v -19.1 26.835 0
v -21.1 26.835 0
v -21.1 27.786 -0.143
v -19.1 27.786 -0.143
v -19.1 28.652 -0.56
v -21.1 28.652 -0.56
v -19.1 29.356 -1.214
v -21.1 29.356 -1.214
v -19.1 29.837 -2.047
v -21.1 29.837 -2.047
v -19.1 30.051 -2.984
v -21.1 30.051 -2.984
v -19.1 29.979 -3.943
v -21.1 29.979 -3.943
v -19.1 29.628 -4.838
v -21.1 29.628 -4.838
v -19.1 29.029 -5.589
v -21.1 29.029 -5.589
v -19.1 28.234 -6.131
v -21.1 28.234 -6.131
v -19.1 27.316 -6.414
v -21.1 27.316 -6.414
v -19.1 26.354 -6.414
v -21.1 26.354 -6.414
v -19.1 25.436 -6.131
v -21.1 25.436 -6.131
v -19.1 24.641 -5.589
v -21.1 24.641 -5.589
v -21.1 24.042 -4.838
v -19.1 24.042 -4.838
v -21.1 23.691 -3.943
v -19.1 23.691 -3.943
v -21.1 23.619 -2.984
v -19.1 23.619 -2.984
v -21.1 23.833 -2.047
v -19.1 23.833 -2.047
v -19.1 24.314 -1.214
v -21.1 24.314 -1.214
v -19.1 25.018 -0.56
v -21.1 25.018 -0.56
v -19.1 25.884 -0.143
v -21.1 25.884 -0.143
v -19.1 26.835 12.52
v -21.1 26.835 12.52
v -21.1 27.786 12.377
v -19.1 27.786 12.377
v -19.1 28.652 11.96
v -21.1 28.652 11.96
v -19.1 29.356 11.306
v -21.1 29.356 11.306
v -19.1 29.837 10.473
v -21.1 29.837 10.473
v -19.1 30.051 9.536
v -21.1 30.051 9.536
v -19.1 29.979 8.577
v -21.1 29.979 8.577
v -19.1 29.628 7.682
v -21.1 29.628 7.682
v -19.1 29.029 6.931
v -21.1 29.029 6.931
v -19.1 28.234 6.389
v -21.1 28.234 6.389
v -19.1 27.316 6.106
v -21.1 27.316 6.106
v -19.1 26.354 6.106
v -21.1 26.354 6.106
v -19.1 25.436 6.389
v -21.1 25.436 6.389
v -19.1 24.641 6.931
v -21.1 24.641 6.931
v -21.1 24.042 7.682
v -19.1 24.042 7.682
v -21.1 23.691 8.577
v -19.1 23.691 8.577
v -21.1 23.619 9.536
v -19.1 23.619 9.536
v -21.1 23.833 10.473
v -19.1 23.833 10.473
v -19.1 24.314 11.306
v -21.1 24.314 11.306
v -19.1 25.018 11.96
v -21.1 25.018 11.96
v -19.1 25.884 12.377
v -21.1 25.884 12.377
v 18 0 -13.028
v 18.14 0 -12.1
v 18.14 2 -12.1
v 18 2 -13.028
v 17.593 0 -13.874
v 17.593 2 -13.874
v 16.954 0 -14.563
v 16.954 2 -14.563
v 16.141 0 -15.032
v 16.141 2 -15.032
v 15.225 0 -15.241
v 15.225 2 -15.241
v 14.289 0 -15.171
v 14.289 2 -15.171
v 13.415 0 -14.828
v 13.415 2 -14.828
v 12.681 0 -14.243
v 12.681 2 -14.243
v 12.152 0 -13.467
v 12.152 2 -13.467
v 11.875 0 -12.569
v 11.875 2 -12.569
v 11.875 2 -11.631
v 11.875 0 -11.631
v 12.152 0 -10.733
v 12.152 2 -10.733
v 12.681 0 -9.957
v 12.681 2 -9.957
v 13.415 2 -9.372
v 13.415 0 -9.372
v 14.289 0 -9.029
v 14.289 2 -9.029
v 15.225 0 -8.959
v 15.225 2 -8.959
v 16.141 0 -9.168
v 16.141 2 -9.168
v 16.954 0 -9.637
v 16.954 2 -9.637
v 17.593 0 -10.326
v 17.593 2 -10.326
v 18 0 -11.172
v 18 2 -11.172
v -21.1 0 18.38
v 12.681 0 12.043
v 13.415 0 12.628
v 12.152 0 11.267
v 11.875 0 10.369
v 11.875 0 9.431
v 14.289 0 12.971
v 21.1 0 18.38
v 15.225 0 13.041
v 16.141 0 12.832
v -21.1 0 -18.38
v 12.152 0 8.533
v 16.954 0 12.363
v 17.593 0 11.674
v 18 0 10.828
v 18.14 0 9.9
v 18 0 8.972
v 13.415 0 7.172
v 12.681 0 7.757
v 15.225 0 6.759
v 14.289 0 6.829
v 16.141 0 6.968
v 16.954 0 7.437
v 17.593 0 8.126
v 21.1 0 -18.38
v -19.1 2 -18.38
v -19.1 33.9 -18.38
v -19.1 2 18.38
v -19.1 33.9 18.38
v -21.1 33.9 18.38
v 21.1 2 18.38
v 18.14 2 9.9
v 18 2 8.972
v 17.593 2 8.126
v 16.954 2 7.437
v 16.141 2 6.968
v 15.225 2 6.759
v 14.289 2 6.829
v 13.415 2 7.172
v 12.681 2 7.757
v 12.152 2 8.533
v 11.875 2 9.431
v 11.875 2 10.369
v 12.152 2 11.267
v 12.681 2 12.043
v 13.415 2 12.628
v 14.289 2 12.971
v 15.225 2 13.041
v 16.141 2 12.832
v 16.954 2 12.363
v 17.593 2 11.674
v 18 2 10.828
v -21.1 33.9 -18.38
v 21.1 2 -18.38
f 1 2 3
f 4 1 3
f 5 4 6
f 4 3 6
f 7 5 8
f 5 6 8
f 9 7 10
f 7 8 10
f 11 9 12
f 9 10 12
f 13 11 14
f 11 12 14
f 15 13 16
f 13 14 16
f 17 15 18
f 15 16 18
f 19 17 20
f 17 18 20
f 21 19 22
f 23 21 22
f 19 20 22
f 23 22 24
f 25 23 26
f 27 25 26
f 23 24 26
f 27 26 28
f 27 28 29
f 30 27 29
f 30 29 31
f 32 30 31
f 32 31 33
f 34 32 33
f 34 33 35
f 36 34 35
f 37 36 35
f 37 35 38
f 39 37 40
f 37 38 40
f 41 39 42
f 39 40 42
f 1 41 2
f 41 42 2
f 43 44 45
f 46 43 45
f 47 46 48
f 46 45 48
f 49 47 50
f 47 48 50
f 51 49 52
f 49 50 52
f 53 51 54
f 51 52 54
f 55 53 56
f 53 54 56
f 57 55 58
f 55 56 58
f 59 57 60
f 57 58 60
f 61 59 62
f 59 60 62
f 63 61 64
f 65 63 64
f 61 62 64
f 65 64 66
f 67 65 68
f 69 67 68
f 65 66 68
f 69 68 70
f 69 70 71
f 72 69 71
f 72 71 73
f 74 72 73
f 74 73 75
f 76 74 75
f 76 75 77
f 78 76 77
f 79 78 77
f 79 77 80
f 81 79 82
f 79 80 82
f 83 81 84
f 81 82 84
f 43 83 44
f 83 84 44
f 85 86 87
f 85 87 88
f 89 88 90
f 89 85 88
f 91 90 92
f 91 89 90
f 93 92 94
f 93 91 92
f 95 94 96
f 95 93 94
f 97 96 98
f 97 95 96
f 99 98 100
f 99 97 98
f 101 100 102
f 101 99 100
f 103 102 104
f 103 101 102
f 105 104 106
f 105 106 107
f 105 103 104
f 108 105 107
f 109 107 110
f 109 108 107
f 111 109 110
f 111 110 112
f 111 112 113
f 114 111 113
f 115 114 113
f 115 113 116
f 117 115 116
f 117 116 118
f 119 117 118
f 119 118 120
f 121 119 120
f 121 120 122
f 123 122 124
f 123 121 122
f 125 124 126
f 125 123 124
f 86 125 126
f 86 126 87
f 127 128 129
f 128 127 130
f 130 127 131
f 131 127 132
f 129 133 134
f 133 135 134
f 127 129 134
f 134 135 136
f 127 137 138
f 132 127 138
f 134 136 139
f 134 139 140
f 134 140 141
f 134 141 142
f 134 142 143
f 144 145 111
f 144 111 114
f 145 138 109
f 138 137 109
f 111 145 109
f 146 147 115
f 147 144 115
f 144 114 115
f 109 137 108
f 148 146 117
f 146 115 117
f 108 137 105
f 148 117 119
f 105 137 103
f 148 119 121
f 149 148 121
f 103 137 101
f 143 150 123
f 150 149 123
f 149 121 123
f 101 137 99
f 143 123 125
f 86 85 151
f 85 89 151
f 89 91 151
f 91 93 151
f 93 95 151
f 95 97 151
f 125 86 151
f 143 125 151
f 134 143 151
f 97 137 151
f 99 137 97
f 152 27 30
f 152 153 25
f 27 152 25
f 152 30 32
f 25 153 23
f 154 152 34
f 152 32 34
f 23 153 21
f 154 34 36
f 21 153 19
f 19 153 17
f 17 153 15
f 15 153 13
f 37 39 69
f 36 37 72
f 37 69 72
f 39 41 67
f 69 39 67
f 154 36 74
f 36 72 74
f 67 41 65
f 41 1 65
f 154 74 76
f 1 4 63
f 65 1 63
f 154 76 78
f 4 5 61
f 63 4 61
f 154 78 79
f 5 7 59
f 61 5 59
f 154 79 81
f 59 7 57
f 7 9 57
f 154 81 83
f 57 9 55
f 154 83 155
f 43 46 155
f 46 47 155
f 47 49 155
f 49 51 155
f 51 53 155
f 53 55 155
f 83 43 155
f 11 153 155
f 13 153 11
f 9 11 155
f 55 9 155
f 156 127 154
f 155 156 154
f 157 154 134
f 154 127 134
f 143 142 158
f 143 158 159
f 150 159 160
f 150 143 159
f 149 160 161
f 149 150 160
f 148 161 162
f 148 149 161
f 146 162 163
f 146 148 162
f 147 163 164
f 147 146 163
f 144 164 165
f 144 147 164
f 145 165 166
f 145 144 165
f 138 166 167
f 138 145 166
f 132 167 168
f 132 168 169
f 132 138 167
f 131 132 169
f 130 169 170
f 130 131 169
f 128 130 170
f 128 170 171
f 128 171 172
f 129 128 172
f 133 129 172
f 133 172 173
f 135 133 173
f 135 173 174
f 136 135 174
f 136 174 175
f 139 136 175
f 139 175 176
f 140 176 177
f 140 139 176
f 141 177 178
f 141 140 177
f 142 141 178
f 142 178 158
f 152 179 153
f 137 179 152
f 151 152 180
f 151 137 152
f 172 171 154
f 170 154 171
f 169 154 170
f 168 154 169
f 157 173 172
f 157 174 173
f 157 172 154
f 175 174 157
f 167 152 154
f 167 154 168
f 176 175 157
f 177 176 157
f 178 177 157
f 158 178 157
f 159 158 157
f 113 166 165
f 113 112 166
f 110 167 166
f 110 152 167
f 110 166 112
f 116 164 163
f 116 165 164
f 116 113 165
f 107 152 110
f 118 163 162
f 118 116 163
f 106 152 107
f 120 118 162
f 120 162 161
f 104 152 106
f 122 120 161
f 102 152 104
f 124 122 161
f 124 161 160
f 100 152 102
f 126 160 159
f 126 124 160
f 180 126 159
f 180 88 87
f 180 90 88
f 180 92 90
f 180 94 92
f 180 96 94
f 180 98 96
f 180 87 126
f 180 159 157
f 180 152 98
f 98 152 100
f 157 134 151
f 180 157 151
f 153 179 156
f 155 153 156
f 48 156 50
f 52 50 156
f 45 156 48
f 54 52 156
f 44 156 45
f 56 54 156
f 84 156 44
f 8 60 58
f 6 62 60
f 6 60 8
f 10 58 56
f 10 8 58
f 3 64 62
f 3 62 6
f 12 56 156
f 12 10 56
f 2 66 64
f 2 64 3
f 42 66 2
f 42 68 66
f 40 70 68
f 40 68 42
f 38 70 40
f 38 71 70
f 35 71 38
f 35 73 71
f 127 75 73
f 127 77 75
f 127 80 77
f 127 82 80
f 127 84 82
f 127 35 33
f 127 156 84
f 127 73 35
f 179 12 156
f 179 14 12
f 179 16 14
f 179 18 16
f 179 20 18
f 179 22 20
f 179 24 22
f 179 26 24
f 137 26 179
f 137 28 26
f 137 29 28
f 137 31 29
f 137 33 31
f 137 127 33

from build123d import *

# Parameters (mm, degrees)
SKETCH1_W  = 42.2
SKETCH1_H  = 36.76
SKETCH1_R  = 3.15
BASE_DEPTH = 2
SKETCH3_W  = 36.76
SKETCH3_H  = 33.9
SKETCH3_R  = 3.225
TAB_DEPTH  = 2


with BuildPart() as part:
    # Sketch1 → Base (new body)
    with BuildSketch(Plane(origin=(0, 0, 0), x_dir=(1, 0, 0), z_dir=(0, 1, 0))):
        Rectangle(SKETCH1_W, SKETCH1_H)
        with Locations((14.99, 12.1)):
            Circle(SKETCH1_R, mode=Mode.SUBTRACT)
        with Locations((14.99, -9.9)):
            Circle(SKETCH1_R, mode=Mode.SUBTRACT)
    extrude(amount=BASE_DEPTH)

    # Sketch3 → Tab (add)
    with BuildSketch(Plane.ZY.offset(21.1)):
        with Locations((0, 16.95)):
            Rectangle(SKETCH3_W, SKETCH3_H)
        with Locations((-3.225, 26.835)):
            Circle(SKETCH3_R, mode=Mode.SUBTRACT)
        with Locations((9.295, 26.835)):
            Circle(SKETCH3_R, mode=Mode.SUBTRACT)
    extrude(amount=-TAB_DEPTH)


solid = part.part
